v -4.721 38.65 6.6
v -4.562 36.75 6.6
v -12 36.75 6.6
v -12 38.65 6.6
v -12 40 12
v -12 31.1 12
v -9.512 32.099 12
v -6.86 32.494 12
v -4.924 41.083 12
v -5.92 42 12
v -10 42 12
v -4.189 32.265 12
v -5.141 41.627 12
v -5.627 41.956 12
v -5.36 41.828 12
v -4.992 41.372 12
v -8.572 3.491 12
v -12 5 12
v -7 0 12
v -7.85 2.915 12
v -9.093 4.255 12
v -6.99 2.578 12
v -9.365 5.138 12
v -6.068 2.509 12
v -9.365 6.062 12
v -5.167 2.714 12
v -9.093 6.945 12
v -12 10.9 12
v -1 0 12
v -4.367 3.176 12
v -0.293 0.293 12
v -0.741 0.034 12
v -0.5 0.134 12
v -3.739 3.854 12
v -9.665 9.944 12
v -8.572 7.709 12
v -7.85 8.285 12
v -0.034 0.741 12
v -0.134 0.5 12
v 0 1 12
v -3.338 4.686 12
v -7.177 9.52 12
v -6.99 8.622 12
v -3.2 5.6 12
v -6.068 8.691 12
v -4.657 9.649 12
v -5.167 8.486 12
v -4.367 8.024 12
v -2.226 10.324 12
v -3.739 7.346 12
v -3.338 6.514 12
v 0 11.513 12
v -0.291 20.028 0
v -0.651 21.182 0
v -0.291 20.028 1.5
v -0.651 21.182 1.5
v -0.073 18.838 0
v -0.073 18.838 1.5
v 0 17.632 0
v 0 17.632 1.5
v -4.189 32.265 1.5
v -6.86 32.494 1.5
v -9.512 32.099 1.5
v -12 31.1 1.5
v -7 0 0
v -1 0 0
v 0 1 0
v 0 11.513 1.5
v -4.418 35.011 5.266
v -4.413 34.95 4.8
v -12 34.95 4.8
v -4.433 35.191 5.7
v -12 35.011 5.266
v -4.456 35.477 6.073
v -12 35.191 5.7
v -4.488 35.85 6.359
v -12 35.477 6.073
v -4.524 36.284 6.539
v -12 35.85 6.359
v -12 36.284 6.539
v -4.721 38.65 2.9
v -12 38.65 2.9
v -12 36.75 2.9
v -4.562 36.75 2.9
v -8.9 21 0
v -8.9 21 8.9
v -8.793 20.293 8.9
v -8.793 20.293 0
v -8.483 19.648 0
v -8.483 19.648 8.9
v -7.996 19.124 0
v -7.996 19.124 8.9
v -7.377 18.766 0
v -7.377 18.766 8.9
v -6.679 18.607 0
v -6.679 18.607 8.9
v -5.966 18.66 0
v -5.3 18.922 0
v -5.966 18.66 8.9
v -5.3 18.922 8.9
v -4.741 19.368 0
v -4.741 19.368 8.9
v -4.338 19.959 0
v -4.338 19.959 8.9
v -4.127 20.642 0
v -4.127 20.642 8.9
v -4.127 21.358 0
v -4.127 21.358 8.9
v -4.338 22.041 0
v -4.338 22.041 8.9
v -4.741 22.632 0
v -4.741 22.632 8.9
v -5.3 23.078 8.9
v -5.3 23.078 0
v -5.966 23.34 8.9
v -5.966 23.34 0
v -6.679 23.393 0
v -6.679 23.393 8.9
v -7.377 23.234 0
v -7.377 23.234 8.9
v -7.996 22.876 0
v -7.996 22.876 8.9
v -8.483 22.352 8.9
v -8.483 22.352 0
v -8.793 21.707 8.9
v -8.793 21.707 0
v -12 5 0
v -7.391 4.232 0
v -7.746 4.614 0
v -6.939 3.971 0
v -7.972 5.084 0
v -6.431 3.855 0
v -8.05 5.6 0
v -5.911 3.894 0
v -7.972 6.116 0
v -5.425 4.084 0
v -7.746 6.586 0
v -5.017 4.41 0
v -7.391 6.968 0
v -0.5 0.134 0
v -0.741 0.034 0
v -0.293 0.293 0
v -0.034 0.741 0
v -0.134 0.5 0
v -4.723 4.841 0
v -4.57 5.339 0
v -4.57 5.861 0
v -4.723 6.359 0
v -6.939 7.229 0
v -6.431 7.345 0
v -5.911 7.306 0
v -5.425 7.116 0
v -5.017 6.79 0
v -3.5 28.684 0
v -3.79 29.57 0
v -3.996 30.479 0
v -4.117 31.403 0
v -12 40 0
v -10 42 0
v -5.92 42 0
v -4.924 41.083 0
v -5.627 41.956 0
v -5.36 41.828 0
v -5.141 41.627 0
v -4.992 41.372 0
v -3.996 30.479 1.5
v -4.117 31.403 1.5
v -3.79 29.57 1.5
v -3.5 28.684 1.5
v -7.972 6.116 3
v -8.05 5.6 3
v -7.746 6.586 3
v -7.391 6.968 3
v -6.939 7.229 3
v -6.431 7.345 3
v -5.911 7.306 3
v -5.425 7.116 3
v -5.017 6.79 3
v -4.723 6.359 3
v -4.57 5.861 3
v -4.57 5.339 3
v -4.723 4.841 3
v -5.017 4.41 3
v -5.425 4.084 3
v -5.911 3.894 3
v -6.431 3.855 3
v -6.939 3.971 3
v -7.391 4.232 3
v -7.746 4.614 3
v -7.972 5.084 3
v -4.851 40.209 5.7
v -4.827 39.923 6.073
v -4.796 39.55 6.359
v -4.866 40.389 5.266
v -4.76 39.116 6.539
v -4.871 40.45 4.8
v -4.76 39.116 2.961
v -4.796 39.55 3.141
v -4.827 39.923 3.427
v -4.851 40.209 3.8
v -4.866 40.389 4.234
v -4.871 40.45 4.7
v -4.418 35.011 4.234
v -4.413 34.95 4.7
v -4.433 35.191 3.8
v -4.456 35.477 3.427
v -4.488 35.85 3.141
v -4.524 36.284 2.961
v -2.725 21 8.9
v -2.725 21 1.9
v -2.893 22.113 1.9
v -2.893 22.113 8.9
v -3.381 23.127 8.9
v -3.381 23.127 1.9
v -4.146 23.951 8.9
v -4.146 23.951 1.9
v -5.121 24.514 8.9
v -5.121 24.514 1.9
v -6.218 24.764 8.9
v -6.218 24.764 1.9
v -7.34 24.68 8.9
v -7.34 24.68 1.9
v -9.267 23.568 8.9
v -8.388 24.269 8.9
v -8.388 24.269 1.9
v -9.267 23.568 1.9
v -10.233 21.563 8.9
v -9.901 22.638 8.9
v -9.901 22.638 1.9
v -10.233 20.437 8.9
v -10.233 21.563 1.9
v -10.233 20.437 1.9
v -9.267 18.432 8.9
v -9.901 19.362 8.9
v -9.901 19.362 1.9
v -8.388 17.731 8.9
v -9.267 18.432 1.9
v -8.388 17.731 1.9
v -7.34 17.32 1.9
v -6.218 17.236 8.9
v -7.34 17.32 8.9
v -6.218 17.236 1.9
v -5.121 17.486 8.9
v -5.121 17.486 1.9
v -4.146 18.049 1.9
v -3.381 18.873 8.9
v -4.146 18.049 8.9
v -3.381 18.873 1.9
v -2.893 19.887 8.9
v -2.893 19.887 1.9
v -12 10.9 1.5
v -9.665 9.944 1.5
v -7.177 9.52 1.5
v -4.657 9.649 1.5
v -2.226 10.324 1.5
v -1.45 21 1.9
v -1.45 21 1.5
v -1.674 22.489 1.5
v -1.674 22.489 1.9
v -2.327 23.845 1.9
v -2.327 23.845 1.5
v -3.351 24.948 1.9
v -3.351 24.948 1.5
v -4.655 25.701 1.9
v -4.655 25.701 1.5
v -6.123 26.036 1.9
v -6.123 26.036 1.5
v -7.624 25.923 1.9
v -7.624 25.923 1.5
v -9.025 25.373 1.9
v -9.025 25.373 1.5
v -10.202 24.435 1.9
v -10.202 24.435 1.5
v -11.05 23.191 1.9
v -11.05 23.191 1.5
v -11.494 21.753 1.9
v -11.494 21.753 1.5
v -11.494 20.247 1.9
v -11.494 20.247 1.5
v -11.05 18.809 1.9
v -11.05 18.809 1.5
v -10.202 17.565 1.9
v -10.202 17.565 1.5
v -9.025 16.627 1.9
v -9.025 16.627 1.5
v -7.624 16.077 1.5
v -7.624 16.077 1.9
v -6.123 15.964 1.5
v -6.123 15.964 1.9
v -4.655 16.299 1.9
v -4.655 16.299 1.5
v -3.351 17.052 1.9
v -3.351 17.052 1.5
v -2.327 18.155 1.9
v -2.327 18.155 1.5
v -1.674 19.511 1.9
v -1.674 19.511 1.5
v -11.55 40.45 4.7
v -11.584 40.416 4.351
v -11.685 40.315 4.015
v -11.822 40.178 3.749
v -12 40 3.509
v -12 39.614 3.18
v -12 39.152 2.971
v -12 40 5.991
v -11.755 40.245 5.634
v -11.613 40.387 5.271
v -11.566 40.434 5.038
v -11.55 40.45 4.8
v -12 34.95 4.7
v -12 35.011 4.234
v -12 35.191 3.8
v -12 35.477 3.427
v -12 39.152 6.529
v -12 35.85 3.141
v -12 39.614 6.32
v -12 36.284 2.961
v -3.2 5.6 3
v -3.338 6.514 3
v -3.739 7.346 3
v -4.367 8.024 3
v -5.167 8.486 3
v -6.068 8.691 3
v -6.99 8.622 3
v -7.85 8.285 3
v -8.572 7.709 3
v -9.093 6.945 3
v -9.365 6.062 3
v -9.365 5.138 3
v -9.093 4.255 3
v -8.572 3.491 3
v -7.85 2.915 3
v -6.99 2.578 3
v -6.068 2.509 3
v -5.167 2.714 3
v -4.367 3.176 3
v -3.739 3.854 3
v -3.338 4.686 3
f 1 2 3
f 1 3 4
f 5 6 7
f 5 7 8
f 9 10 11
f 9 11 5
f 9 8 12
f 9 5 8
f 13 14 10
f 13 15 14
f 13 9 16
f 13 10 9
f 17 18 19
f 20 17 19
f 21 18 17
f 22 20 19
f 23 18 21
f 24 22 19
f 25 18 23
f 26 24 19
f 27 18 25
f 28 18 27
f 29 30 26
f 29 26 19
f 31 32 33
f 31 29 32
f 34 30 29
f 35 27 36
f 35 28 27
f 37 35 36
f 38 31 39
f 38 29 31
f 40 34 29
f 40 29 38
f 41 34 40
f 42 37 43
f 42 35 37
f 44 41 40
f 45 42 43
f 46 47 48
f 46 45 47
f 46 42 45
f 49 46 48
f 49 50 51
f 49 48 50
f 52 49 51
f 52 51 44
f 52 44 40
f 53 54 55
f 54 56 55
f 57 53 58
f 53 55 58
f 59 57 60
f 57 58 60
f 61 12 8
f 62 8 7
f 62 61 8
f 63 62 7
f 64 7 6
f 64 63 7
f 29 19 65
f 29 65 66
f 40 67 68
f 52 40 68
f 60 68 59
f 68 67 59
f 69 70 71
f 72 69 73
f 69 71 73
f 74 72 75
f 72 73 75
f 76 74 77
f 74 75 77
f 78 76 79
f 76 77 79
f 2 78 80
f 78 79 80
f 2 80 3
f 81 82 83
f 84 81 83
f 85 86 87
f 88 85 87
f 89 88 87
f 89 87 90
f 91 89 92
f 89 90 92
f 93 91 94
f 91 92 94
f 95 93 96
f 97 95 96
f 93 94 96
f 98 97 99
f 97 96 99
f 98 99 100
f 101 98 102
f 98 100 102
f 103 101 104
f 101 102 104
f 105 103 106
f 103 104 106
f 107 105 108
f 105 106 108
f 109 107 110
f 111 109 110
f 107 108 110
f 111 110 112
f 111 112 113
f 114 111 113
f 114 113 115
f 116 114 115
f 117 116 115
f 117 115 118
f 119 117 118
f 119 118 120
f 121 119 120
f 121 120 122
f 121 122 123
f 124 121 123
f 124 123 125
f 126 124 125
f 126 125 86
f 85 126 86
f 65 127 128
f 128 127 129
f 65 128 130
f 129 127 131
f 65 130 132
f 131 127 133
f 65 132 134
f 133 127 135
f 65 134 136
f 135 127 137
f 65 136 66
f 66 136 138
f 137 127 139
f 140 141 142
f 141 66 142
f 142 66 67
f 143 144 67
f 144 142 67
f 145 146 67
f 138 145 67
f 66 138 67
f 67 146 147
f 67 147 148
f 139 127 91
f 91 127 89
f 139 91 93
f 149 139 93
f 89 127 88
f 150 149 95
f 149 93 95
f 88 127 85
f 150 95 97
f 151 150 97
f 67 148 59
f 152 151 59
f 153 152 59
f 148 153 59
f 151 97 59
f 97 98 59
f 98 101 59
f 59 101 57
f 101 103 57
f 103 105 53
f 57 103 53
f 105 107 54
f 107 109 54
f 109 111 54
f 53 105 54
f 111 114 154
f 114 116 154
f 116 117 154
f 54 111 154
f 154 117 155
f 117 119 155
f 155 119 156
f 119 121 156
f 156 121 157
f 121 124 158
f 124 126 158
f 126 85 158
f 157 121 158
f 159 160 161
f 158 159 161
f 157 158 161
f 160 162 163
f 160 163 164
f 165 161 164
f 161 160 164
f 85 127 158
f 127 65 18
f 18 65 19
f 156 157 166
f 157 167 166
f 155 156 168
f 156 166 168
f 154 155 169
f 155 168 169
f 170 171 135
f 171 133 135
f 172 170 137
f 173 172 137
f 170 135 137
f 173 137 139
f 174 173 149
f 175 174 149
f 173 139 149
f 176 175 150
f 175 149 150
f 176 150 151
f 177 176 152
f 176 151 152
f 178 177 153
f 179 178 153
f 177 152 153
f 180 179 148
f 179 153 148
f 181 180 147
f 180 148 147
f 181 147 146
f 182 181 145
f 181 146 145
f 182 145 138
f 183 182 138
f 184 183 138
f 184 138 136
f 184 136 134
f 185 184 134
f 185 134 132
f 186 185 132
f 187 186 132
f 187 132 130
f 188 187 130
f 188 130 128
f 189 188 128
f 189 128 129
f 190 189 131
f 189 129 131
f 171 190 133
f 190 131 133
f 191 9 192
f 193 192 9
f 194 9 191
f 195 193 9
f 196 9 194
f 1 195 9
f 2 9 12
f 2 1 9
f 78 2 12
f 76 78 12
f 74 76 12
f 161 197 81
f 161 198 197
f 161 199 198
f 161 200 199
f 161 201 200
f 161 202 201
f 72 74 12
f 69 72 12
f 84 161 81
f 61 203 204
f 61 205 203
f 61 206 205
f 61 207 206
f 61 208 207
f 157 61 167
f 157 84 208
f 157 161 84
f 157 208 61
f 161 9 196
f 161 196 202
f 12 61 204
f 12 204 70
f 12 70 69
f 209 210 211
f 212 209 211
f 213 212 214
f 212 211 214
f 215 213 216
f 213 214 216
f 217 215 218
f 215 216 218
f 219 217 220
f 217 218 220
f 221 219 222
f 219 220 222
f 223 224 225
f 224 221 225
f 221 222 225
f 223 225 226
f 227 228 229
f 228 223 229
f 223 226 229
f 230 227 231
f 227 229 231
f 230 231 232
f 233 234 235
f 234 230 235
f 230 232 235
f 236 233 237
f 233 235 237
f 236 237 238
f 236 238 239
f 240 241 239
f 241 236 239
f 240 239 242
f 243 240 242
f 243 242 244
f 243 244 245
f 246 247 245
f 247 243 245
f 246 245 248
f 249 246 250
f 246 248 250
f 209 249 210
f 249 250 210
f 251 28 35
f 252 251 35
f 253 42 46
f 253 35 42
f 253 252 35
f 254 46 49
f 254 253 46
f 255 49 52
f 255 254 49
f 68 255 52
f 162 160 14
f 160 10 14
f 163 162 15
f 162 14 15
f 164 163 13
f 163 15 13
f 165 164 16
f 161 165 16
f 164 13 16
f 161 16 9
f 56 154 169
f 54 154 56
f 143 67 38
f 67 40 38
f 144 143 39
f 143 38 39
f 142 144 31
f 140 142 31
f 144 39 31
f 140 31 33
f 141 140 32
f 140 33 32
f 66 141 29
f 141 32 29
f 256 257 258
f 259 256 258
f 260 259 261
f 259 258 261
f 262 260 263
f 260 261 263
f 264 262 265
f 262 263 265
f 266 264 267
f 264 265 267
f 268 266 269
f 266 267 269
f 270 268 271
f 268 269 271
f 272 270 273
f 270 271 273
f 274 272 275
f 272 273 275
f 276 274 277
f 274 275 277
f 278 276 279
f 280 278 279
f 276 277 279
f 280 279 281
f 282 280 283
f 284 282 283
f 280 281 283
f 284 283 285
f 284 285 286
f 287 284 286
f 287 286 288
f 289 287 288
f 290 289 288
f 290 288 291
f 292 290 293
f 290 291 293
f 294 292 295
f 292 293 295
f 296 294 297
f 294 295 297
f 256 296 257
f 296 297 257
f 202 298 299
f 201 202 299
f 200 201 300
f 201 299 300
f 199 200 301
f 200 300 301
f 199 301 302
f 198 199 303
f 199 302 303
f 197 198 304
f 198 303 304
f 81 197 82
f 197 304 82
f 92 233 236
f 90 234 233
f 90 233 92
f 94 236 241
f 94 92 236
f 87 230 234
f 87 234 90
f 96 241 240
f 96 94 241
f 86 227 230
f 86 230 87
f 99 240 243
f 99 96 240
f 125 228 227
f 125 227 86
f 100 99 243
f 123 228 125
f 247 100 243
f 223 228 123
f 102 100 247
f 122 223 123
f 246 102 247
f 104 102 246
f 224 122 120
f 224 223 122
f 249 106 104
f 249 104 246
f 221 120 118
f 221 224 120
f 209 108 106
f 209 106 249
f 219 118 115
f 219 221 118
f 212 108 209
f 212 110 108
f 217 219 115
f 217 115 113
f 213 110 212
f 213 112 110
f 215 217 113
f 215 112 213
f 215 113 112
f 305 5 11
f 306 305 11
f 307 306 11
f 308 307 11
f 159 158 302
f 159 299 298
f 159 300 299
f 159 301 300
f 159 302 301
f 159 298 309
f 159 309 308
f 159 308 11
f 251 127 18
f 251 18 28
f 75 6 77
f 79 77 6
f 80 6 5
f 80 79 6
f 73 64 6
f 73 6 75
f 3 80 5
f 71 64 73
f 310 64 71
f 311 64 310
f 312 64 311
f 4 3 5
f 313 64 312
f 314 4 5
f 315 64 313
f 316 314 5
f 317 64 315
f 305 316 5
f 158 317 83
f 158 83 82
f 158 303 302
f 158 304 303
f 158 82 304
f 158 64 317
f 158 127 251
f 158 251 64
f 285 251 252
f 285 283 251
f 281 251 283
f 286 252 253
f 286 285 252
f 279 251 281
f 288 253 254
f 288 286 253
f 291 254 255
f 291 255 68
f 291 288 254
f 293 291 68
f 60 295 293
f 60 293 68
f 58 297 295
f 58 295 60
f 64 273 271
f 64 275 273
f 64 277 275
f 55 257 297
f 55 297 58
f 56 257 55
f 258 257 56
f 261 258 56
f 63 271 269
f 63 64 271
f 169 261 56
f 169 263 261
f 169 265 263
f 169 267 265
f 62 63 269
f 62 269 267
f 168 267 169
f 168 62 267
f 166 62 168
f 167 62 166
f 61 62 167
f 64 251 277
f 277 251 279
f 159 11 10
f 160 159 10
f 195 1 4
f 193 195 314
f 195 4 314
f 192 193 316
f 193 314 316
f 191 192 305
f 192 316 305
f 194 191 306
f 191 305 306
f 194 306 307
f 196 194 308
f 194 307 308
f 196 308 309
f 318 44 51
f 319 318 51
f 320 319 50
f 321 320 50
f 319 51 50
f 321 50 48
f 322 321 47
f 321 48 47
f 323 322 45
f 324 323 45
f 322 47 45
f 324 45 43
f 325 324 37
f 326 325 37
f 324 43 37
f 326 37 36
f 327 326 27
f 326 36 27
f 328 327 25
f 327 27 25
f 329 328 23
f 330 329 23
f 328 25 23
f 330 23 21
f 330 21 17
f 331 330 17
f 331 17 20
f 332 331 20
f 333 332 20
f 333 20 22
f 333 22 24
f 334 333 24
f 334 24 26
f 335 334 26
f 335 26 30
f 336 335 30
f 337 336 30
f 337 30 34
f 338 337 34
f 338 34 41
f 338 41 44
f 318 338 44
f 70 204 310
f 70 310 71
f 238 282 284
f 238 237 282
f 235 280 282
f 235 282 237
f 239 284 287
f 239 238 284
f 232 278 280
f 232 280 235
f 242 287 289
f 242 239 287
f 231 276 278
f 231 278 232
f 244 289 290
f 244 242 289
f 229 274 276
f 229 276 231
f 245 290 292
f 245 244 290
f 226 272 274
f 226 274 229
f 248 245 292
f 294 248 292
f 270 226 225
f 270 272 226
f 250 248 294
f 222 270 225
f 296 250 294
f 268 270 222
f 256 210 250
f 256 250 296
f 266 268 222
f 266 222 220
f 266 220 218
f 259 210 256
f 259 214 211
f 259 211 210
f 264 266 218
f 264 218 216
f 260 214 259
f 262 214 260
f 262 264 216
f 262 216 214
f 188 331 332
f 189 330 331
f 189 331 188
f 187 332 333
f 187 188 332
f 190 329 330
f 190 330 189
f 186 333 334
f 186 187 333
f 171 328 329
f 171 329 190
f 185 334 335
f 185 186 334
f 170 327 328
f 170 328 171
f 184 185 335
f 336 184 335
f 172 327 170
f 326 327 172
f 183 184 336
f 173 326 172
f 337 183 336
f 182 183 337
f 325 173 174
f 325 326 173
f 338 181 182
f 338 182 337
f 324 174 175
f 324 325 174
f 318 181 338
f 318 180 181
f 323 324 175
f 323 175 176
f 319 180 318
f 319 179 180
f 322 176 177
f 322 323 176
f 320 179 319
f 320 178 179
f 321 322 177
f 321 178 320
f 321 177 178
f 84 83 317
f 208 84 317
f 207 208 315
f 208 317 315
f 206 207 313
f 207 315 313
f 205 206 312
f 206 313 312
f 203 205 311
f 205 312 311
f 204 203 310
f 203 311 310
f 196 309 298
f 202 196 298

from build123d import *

# Parameters (mm, degrees)
F1_W            = 12
F1_H            = 42
F2_DEPTH        = 12
F7_R            = 11.5
F7_R_2          = 3.775
F9_DEPTH        = 25
F8_R            = 5.05
F10_DEPTH       = 0.4
F11_D           = 4.8
F12_D           = 3.5
F12_CBORE_D     = 6.2
F12_CBORE_DEPTH = 9
F14_DEPTH       = 25
F16_DEPTH       = 25
F17_SIZE        = 5
F18_T1_DEPTH    = 22.2867319519
F19_R           = 1
F20_R           = 4.5
F21_DEPTH       = 3.1
F22_R           = 10


# Not quite as in the source:
# - a fillet or chamfer that OpenCascade refuses, or shapes differently, is made with other operations: its cross-section is extruded or revolved along the edge and cut away or added


with BuildPart() as f2:
    # F1 (on Top) → F2 (new body)
    with BuildSketch(Plane.XY):
        with Locations((-6, 21)):
            Rectangle(F1_W, F1_H)
    extrude(amount=F2_DEPTH)

    # F7 (on offset) → F9 (cut)
    with BuildSketch(Plane.XY.offset(1.5)):
        with Locations((-6.5, 21)):
            Circle(F7_R)
        with Locations((-6.5, 21)):
            Circle(F7_R_2, mode=Mode.SUBTRACT)
    extrude(amount=F9_DEPTH, mode=Mode.SUBTRACT)

    # F8 (on offset) → F10 (join)
    with BuildSketch(Plane.XY.offset(1.5)):
        with Locations((-6.5, 21)):
            Circle(F8_R)
    extrude(amount=F10_DEPTH)

    # F11 (through all)
    with Locations(Plane(origin=(0, 0, 0), x_dir=(1, 0, 0), z_dir=(0, 0, -1))):
        with Locations((-6.5, -21)):
            Hole(F11_D / 2)

    # F12 (through all)
    with Locations(Plane.XY.offset(12)):
        with Locations((-6.3, 5.6)):
            CounterBoreHole(F12_D / 2, F12_CBORE_D / 2, F12_CBORE_DEPTH)

    # F13 (on Top) → F14 (cut)
    with BuildSketch(Plane.XY):
        Polygon((-5, 42), (-4, 30), (0, 19.4664706794), (0, 42), align=None)
    extrude(amount=F14_DEPTH, mode=Mode.SUBTRACT)

    # F15 (on offset) → F16 (cut)
    with BuildSketch(Plane(origin=(-12, 0, 0), x_dir=(0, -1, 0), z_dir=(-1, 0, 0))):
        with BuildLine():
            Line((-36.75, 6.6), (-38.65, 6.6))
            ThreePointArc((-38.65, 6.6), (-39.9227922061, 6.0727922061), (-40.45, 4.8))
            Line((-40.45, 4.8), (-40.45, 4.7))
            ThreePointArc((-40.45, 4.7), (-39.9227922061, 3.4272077939), (-38.65, 2.9))
            Line((-38.65, 2.9), (-36.75, 2.9))
            ThreePointArc((-36.75, 2.9), (-35.4772077939, 3.4272077939), (-34.95, 4.7))
            Line((-34.95, 4.7), (-34.95, 4.8))
            ThreePointArc((-34.95, 4.8), (-35.4772077939, 6.0727922061), (-36.75, 6.6))
        make_face()
    extrude(amount=-F16_DEPTH, mode=Mode.SUBTRACT)

    # F17
    f17_edges = [f2.edges().sort_by_distance(p)[0] for p in [
        (-12, 0, 6),
    ]]
    chamfer(f17_edges, length=F17_SIZE)

    # F18: chamfer of 2 on 1 edges, made by hand

    # F18_s2 → F18_t1 (cut)
    with BuildSketch(Plane.XY.offset(-5.1433659759)):
        Polygon((-12, 40), (-10, 42), (-12, 42), align=None)
    extrude(amount=F18_T1_DEPTH, mode=Mode.SUBTRACT)

    # F19
    f19_edges = [f2.edges().sort_by_distance(p)[0] for p in [
        (0, 0, 6),
        (-5, 42, 6),
    ]]
    fillet(f19_edges, radius=F19_R)

    # F20 (on offset) → F21 (cut)
    with BuildSketch(Plane.XY.offset(12)):
        with Locations((-6.5, 21)):
            Circle(F20_R)
    extrude(amount=-F21_DEPTH, mode=Mode.SUBTRACT)

    # F22
    f22_edges = [f2.edges().sort_by_distance(p)[0] for p in [
        (-4, 30, 0.75),
        (0, 19.466471, 0.75),
    ]]
    fillet(f22_edges, radius=F22_R)


solid = f2.part
